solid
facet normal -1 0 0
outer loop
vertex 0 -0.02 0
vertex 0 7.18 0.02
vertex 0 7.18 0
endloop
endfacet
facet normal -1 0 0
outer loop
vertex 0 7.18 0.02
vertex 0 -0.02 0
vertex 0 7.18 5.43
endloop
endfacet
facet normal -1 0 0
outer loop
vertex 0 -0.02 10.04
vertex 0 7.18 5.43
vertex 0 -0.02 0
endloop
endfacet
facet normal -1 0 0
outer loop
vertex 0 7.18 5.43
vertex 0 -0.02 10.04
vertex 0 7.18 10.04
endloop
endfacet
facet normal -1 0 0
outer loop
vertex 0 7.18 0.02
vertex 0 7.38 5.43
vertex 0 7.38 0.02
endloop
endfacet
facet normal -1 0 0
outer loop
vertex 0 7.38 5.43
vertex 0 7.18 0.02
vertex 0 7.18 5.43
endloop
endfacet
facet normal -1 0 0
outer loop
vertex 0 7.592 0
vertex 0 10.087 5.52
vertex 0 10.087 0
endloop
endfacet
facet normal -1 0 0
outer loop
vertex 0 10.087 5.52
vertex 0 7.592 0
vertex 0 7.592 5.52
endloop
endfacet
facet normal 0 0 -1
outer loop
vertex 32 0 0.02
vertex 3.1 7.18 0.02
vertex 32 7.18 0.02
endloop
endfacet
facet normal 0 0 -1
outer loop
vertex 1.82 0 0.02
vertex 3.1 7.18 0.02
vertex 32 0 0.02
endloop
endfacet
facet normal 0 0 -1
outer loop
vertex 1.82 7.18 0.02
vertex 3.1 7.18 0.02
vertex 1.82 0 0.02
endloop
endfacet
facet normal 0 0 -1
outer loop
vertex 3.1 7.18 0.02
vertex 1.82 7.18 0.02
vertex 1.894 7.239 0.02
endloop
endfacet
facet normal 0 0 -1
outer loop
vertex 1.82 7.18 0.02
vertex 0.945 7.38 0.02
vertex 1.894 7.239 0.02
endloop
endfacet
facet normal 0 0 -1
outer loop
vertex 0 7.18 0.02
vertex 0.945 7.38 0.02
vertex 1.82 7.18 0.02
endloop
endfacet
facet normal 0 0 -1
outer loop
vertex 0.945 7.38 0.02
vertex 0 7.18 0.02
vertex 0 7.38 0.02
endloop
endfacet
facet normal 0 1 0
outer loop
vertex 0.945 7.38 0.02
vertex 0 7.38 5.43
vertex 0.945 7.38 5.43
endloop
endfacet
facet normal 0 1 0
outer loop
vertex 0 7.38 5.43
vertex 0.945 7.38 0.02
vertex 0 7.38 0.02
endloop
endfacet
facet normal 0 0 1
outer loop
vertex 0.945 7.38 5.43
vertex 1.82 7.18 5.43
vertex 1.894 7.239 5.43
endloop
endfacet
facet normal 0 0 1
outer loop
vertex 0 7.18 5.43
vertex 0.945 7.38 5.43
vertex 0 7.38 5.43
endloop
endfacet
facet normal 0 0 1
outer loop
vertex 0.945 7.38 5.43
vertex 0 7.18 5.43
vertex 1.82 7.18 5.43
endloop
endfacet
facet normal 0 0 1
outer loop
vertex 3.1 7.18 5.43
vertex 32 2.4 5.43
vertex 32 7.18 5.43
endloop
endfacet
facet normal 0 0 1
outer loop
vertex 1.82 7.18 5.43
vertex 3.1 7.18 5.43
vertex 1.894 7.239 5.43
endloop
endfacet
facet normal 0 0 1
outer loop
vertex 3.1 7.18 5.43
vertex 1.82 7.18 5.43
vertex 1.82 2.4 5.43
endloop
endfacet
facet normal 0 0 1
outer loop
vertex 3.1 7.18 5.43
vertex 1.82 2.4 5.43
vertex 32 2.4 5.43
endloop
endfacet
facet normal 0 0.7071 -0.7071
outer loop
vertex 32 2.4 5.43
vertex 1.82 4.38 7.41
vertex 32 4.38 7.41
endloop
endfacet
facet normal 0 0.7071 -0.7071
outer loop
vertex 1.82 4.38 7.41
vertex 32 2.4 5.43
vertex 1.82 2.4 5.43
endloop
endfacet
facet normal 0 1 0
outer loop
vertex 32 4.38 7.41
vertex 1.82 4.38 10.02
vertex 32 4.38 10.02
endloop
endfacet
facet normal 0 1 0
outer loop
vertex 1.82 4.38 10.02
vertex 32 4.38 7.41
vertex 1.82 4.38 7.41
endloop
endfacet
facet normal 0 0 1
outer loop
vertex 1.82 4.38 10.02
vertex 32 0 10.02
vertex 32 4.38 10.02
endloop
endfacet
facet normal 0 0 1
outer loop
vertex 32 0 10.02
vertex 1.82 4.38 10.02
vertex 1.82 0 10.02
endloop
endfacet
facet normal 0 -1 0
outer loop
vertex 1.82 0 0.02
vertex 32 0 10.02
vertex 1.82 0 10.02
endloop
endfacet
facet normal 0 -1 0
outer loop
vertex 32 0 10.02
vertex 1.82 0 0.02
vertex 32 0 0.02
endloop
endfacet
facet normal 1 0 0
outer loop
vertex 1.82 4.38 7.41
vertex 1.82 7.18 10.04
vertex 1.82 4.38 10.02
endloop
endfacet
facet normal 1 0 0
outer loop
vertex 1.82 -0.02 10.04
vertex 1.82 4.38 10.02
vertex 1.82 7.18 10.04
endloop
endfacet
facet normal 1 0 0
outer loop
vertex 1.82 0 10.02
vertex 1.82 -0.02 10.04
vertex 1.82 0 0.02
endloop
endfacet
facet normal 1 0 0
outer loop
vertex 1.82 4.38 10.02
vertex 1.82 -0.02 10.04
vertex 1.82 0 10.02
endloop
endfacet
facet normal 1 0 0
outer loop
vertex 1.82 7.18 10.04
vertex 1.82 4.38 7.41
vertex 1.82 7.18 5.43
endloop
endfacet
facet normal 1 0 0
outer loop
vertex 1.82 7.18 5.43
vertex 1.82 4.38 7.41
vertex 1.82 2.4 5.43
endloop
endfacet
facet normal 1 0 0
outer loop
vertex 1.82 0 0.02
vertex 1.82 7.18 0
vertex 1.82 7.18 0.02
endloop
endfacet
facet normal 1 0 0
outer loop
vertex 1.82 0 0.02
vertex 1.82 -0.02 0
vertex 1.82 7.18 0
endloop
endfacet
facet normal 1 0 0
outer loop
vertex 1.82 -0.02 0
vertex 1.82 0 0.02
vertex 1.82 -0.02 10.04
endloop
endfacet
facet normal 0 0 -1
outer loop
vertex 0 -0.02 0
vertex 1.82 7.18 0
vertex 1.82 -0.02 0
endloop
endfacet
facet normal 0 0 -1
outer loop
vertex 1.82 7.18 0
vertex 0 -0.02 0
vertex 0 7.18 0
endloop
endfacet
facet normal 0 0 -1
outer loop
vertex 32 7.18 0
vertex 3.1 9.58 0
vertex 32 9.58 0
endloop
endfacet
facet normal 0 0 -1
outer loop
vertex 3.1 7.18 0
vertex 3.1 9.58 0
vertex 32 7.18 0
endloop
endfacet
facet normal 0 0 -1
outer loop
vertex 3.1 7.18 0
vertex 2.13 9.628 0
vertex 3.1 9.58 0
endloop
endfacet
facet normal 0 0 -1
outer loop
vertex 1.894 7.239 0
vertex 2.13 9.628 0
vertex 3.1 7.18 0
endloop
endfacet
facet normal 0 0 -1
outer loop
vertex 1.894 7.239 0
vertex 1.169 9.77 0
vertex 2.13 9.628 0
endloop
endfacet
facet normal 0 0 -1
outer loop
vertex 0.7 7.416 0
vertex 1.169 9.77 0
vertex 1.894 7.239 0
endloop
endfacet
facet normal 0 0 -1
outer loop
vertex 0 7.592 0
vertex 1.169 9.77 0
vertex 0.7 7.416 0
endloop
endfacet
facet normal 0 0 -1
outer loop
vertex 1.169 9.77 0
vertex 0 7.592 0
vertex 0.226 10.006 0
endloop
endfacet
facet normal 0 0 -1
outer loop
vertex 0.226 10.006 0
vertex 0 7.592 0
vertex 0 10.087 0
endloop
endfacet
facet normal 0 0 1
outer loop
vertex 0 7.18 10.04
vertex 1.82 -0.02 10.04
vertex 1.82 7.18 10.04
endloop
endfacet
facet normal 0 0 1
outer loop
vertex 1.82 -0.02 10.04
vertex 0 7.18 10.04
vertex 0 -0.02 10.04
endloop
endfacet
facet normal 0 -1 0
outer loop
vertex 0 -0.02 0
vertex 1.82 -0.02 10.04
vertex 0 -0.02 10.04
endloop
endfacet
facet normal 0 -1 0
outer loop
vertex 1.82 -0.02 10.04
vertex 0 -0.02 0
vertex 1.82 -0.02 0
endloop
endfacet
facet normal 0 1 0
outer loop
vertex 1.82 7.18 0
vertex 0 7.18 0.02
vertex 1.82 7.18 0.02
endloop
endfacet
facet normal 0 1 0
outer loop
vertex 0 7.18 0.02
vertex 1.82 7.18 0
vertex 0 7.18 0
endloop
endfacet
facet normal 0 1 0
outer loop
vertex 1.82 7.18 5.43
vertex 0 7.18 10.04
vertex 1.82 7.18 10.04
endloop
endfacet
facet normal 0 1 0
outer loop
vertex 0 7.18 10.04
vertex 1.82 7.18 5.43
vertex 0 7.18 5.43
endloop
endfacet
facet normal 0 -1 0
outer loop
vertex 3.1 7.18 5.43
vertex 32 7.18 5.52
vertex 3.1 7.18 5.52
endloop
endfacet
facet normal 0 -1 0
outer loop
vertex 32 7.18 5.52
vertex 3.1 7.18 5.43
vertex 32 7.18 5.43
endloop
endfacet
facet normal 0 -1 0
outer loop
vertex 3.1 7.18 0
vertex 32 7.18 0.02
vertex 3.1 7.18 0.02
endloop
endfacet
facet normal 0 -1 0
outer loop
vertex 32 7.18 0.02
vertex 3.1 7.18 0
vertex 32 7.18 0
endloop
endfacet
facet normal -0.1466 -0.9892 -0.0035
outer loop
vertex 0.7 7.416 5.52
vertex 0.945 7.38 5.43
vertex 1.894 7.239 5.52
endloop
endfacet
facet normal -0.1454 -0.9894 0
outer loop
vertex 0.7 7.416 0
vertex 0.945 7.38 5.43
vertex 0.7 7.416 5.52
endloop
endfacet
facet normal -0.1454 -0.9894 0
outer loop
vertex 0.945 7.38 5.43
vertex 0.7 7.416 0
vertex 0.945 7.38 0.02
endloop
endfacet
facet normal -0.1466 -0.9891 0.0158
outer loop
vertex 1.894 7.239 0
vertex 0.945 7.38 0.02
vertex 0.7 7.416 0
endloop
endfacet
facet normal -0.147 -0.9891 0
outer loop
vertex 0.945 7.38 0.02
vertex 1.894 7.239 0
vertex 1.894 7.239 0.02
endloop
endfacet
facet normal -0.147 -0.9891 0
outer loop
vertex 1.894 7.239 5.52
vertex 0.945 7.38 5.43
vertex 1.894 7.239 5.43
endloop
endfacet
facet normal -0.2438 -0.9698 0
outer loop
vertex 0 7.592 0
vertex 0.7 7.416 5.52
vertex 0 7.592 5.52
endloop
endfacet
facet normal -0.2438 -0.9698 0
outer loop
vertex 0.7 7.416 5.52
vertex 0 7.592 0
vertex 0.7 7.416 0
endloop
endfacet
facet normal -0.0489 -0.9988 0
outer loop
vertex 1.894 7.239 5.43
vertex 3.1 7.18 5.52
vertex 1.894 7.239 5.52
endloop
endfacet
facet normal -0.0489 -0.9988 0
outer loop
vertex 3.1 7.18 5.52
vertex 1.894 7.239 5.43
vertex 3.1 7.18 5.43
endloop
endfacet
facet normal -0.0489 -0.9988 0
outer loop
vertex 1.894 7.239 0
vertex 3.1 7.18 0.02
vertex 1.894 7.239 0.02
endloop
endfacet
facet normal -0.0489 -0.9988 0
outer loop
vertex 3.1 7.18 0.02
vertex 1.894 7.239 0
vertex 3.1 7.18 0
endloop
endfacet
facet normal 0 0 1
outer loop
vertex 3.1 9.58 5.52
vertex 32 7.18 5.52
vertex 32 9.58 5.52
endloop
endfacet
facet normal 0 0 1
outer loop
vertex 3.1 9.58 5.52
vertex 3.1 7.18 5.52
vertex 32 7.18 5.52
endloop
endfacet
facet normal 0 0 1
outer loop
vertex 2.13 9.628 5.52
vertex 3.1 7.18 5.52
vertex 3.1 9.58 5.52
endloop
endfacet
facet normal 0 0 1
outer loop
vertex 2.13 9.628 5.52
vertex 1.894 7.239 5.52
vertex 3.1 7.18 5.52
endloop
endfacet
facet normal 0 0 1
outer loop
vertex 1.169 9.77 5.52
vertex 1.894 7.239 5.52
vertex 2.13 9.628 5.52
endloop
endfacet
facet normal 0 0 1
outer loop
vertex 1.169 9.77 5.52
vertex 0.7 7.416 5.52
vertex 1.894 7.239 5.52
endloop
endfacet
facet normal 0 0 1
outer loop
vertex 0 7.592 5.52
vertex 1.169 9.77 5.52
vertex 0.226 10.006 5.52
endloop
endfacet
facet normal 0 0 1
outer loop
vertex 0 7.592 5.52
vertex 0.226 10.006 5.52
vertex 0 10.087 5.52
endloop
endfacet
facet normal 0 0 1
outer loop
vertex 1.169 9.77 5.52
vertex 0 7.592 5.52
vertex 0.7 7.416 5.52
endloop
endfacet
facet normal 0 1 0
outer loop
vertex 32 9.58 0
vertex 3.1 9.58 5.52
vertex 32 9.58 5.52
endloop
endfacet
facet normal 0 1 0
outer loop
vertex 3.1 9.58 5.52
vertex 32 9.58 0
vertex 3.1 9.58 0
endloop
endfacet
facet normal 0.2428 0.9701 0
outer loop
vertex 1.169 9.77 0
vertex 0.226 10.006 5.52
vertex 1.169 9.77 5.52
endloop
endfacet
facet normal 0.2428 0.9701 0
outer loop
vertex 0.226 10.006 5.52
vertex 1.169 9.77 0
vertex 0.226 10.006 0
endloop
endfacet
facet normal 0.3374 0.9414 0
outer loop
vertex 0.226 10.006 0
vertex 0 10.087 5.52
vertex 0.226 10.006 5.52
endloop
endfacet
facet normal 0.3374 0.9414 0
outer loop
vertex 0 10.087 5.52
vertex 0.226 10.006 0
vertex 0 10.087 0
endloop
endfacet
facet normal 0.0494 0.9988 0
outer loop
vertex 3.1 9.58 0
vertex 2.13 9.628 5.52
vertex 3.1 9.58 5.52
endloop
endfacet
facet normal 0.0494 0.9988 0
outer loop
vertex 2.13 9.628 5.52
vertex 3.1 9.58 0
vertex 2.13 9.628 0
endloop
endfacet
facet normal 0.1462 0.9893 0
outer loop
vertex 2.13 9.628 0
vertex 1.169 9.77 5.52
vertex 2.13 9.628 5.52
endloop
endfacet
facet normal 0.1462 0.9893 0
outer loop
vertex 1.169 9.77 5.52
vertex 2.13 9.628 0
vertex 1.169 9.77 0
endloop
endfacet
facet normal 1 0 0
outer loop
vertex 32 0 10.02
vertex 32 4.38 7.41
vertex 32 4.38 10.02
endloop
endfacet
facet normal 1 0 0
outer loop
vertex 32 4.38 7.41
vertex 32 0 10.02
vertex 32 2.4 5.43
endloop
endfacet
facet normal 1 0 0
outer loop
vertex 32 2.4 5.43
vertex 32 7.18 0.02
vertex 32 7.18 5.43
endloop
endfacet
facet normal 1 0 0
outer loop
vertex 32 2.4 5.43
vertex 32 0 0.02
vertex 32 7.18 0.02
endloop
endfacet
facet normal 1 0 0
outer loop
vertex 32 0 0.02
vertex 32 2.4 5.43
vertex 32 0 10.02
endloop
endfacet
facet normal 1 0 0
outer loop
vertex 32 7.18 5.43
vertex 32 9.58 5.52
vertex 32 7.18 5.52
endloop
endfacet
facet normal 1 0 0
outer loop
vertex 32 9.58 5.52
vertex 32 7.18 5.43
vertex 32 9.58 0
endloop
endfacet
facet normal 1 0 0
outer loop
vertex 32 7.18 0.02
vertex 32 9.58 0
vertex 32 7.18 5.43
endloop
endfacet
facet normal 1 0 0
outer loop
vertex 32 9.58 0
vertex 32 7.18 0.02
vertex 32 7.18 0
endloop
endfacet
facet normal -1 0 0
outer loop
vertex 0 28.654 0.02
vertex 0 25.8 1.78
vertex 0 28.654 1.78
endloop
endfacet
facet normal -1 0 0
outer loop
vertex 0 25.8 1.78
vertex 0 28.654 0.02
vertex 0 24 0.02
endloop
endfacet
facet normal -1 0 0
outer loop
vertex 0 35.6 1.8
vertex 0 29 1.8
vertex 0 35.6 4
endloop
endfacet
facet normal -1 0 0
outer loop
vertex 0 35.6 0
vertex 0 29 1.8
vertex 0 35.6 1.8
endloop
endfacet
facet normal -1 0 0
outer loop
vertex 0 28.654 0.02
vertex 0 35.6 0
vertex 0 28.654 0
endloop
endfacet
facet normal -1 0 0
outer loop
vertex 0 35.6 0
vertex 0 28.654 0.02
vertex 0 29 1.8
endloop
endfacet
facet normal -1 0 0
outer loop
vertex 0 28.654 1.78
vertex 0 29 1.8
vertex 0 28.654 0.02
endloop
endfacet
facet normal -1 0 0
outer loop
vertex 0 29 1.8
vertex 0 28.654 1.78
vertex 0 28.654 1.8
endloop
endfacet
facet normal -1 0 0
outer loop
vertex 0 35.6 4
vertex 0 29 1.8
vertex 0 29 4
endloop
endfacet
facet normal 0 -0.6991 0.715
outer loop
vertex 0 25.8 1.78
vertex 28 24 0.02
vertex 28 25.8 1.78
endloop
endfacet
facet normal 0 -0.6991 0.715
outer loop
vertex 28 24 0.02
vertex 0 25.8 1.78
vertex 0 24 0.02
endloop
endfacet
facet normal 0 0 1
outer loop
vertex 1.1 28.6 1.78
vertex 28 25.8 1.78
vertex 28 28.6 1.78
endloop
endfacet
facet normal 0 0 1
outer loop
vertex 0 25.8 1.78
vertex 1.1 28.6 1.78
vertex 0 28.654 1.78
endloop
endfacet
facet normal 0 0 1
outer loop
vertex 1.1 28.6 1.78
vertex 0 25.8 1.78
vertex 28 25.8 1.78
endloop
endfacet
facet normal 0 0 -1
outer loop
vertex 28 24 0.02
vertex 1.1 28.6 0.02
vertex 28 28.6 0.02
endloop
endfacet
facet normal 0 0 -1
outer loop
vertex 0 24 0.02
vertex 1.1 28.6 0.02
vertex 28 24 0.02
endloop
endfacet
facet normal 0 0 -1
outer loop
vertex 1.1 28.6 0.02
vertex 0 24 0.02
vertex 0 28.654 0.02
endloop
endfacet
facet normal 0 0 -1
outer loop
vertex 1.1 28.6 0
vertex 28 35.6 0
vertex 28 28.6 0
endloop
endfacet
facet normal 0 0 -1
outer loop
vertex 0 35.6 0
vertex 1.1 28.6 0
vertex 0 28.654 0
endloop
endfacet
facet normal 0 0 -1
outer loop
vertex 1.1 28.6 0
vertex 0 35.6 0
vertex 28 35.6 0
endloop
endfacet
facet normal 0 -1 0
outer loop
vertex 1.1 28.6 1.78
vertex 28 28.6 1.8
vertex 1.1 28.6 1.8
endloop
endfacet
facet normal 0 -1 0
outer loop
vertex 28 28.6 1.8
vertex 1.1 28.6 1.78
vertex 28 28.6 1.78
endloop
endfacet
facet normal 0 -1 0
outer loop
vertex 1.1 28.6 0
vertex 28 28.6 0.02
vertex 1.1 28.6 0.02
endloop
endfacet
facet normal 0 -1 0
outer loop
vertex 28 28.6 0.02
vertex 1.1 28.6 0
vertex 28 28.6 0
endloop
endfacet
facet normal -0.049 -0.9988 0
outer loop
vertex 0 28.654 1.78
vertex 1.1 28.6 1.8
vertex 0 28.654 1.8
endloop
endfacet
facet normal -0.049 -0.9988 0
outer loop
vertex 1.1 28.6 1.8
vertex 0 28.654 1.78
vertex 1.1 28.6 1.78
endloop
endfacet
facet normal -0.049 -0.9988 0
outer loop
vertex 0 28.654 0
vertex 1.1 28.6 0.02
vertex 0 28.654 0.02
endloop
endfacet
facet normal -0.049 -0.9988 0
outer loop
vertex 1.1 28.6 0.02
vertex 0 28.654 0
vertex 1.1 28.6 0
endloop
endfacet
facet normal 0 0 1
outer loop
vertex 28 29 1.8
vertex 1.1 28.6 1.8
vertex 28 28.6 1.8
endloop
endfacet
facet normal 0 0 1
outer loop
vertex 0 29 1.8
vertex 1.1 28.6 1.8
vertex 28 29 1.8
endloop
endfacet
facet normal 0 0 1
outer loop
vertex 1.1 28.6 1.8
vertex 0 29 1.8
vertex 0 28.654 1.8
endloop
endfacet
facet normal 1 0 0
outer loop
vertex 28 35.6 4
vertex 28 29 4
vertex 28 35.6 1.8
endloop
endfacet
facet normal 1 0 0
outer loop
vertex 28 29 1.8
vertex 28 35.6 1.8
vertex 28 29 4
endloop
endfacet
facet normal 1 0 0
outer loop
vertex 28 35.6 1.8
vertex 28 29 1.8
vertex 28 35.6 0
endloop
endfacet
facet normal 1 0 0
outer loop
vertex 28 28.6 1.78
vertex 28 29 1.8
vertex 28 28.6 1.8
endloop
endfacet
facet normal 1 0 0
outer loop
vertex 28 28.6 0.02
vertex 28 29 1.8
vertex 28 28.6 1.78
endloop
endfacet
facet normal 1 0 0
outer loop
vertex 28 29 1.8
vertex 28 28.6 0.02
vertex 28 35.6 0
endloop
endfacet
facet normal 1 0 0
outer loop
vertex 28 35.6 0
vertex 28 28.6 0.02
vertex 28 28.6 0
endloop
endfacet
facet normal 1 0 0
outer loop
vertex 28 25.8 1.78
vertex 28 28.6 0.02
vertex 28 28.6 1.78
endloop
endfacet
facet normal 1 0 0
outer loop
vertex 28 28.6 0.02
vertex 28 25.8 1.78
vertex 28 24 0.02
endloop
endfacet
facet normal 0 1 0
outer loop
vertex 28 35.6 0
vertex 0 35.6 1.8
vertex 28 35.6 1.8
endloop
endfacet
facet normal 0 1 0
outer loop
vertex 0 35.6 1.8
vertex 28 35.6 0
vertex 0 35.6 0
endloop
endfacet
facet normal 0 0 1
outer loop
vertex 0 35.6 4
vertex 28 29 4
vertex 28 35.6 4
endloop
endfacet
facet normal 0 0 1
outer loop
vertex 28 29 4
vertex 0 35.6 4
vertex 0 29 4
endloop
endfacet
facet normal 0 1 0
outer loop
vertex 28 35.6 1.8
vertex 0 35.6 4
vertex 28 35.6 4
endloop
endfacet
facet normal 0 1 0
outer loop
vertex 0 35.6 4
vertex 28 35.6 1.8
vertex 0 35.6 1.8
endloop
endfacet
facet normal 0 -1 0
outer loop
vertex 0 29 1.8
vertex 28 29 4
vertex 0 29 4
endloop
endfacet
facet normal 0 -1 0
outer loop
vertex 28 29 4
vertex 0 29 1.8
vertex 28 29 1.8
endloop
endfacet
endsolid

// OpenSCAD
// file: models/gopro_buckle.scad
include <../common.scad>
buckle_w=32;                 // Visual approximation only; NOT a printable replacement.
buckle_l=42;
buckle_base=4;
buckle_ear=3;
buckle_gap=3.2;
buckle_axis=15;
buckle_r = 3;                // Planar corners of simplified buckle base.
buckle_ear_r = 7.5;          // Rounded ear envelope; measure the harness coupon.
buckle_bore = 5.2;
buckle_bore_length = 60;     // Boolean cutter spans entire buckle.
module gopro_buckle(){
 color([0.045,0.05,0.06])difference(){
 union(){centered_box([buckle_w,buckle_l,buckle_base],buckle_r);for(x=[-buckle_gap-buckle_ear,0,buckle_gap+buckle_ear])translate([x-buckle_ear/2,0,0])rotate([90,0,90])linear_extrude(buckle_ear)union(){translate([-buckle_ear_r,0])square([2*buckle_ear_r,buckle_axis]);translate([0,buckle_axis])circle(r=buckle_ear_r);}}
 translate([-buckle_bore_length/2,0,buckle_axis])rotate([0,90,0])cylinder(d=buckle_bore,h=buckle_bore_length);
 }
}
gopro_buckle();
// file: models/pixel9pro.scad
include <../common.scad>
// All measured/illustrative phone dimensions are named in common.scad.
// Phone screen at z=0, rear at z=phone_t. Bar toward +X (portrait top).
module pixel9pro(detail=true){
 color([0.025,0.03,0.035]) centered_box([phone_l,phone_w,phone_t],phone_r);
 color([0.18,0.20,0.22]) translate([phone_l/2-camera_bar_top-camera_bar_h/2,camera_bar_side_offset,phone_t]) centered_box([camera_bar_h,camera_bar_w,camera_bar_protrusion],camera_bar_h/2);
 if(detail){
  color([0.025,0.04,0.06]) for(y=phone_lens_y) translate([phone_l/2-camera_bar_top-camera_bar_h/2,y,phone_t+camera_bar_protrusion]) cylinder(d=phone_lens_d,h=phone_detail_t);
  color([0.05,0.14,0.18]) translate([0,0,-phone_detail_t]) centered_box([phone_l-2*phone_screen_inset,phone_w-2*phone_screen_inset,phone_detail_t],phone_r-phone_screen_radius_inset);
 }
 // Conservative button envelope on portrait right edge (-Y in this orientation).
 color([0.12,0.13,0.15]) translate([phone_l/2-phone_button_start-phone_button_length,-phone_w/2-phone_button_depth,phone_button_z]) cube([phone_button_length,phone_button_depth,phone_button_h]);
}
pixel9pro();
// main file
include <common.scad>
use <p1_bodycam.scad>
// Optional rigid rail pair. Same bed/layer direction, backed key, no springs.
module rail_receiver(){p1_rail_test_receiver();}
module rail_key(){union(){p1_rail_test_key();translate([0,5,0])cube([28,6.6,4]);}}
module rail_key_seated(dx=0){translate(p1_rail_test_offset()+[dx,0,0])rail_key();}
rail_receiver();
translate([0,24,0])rail_key();
